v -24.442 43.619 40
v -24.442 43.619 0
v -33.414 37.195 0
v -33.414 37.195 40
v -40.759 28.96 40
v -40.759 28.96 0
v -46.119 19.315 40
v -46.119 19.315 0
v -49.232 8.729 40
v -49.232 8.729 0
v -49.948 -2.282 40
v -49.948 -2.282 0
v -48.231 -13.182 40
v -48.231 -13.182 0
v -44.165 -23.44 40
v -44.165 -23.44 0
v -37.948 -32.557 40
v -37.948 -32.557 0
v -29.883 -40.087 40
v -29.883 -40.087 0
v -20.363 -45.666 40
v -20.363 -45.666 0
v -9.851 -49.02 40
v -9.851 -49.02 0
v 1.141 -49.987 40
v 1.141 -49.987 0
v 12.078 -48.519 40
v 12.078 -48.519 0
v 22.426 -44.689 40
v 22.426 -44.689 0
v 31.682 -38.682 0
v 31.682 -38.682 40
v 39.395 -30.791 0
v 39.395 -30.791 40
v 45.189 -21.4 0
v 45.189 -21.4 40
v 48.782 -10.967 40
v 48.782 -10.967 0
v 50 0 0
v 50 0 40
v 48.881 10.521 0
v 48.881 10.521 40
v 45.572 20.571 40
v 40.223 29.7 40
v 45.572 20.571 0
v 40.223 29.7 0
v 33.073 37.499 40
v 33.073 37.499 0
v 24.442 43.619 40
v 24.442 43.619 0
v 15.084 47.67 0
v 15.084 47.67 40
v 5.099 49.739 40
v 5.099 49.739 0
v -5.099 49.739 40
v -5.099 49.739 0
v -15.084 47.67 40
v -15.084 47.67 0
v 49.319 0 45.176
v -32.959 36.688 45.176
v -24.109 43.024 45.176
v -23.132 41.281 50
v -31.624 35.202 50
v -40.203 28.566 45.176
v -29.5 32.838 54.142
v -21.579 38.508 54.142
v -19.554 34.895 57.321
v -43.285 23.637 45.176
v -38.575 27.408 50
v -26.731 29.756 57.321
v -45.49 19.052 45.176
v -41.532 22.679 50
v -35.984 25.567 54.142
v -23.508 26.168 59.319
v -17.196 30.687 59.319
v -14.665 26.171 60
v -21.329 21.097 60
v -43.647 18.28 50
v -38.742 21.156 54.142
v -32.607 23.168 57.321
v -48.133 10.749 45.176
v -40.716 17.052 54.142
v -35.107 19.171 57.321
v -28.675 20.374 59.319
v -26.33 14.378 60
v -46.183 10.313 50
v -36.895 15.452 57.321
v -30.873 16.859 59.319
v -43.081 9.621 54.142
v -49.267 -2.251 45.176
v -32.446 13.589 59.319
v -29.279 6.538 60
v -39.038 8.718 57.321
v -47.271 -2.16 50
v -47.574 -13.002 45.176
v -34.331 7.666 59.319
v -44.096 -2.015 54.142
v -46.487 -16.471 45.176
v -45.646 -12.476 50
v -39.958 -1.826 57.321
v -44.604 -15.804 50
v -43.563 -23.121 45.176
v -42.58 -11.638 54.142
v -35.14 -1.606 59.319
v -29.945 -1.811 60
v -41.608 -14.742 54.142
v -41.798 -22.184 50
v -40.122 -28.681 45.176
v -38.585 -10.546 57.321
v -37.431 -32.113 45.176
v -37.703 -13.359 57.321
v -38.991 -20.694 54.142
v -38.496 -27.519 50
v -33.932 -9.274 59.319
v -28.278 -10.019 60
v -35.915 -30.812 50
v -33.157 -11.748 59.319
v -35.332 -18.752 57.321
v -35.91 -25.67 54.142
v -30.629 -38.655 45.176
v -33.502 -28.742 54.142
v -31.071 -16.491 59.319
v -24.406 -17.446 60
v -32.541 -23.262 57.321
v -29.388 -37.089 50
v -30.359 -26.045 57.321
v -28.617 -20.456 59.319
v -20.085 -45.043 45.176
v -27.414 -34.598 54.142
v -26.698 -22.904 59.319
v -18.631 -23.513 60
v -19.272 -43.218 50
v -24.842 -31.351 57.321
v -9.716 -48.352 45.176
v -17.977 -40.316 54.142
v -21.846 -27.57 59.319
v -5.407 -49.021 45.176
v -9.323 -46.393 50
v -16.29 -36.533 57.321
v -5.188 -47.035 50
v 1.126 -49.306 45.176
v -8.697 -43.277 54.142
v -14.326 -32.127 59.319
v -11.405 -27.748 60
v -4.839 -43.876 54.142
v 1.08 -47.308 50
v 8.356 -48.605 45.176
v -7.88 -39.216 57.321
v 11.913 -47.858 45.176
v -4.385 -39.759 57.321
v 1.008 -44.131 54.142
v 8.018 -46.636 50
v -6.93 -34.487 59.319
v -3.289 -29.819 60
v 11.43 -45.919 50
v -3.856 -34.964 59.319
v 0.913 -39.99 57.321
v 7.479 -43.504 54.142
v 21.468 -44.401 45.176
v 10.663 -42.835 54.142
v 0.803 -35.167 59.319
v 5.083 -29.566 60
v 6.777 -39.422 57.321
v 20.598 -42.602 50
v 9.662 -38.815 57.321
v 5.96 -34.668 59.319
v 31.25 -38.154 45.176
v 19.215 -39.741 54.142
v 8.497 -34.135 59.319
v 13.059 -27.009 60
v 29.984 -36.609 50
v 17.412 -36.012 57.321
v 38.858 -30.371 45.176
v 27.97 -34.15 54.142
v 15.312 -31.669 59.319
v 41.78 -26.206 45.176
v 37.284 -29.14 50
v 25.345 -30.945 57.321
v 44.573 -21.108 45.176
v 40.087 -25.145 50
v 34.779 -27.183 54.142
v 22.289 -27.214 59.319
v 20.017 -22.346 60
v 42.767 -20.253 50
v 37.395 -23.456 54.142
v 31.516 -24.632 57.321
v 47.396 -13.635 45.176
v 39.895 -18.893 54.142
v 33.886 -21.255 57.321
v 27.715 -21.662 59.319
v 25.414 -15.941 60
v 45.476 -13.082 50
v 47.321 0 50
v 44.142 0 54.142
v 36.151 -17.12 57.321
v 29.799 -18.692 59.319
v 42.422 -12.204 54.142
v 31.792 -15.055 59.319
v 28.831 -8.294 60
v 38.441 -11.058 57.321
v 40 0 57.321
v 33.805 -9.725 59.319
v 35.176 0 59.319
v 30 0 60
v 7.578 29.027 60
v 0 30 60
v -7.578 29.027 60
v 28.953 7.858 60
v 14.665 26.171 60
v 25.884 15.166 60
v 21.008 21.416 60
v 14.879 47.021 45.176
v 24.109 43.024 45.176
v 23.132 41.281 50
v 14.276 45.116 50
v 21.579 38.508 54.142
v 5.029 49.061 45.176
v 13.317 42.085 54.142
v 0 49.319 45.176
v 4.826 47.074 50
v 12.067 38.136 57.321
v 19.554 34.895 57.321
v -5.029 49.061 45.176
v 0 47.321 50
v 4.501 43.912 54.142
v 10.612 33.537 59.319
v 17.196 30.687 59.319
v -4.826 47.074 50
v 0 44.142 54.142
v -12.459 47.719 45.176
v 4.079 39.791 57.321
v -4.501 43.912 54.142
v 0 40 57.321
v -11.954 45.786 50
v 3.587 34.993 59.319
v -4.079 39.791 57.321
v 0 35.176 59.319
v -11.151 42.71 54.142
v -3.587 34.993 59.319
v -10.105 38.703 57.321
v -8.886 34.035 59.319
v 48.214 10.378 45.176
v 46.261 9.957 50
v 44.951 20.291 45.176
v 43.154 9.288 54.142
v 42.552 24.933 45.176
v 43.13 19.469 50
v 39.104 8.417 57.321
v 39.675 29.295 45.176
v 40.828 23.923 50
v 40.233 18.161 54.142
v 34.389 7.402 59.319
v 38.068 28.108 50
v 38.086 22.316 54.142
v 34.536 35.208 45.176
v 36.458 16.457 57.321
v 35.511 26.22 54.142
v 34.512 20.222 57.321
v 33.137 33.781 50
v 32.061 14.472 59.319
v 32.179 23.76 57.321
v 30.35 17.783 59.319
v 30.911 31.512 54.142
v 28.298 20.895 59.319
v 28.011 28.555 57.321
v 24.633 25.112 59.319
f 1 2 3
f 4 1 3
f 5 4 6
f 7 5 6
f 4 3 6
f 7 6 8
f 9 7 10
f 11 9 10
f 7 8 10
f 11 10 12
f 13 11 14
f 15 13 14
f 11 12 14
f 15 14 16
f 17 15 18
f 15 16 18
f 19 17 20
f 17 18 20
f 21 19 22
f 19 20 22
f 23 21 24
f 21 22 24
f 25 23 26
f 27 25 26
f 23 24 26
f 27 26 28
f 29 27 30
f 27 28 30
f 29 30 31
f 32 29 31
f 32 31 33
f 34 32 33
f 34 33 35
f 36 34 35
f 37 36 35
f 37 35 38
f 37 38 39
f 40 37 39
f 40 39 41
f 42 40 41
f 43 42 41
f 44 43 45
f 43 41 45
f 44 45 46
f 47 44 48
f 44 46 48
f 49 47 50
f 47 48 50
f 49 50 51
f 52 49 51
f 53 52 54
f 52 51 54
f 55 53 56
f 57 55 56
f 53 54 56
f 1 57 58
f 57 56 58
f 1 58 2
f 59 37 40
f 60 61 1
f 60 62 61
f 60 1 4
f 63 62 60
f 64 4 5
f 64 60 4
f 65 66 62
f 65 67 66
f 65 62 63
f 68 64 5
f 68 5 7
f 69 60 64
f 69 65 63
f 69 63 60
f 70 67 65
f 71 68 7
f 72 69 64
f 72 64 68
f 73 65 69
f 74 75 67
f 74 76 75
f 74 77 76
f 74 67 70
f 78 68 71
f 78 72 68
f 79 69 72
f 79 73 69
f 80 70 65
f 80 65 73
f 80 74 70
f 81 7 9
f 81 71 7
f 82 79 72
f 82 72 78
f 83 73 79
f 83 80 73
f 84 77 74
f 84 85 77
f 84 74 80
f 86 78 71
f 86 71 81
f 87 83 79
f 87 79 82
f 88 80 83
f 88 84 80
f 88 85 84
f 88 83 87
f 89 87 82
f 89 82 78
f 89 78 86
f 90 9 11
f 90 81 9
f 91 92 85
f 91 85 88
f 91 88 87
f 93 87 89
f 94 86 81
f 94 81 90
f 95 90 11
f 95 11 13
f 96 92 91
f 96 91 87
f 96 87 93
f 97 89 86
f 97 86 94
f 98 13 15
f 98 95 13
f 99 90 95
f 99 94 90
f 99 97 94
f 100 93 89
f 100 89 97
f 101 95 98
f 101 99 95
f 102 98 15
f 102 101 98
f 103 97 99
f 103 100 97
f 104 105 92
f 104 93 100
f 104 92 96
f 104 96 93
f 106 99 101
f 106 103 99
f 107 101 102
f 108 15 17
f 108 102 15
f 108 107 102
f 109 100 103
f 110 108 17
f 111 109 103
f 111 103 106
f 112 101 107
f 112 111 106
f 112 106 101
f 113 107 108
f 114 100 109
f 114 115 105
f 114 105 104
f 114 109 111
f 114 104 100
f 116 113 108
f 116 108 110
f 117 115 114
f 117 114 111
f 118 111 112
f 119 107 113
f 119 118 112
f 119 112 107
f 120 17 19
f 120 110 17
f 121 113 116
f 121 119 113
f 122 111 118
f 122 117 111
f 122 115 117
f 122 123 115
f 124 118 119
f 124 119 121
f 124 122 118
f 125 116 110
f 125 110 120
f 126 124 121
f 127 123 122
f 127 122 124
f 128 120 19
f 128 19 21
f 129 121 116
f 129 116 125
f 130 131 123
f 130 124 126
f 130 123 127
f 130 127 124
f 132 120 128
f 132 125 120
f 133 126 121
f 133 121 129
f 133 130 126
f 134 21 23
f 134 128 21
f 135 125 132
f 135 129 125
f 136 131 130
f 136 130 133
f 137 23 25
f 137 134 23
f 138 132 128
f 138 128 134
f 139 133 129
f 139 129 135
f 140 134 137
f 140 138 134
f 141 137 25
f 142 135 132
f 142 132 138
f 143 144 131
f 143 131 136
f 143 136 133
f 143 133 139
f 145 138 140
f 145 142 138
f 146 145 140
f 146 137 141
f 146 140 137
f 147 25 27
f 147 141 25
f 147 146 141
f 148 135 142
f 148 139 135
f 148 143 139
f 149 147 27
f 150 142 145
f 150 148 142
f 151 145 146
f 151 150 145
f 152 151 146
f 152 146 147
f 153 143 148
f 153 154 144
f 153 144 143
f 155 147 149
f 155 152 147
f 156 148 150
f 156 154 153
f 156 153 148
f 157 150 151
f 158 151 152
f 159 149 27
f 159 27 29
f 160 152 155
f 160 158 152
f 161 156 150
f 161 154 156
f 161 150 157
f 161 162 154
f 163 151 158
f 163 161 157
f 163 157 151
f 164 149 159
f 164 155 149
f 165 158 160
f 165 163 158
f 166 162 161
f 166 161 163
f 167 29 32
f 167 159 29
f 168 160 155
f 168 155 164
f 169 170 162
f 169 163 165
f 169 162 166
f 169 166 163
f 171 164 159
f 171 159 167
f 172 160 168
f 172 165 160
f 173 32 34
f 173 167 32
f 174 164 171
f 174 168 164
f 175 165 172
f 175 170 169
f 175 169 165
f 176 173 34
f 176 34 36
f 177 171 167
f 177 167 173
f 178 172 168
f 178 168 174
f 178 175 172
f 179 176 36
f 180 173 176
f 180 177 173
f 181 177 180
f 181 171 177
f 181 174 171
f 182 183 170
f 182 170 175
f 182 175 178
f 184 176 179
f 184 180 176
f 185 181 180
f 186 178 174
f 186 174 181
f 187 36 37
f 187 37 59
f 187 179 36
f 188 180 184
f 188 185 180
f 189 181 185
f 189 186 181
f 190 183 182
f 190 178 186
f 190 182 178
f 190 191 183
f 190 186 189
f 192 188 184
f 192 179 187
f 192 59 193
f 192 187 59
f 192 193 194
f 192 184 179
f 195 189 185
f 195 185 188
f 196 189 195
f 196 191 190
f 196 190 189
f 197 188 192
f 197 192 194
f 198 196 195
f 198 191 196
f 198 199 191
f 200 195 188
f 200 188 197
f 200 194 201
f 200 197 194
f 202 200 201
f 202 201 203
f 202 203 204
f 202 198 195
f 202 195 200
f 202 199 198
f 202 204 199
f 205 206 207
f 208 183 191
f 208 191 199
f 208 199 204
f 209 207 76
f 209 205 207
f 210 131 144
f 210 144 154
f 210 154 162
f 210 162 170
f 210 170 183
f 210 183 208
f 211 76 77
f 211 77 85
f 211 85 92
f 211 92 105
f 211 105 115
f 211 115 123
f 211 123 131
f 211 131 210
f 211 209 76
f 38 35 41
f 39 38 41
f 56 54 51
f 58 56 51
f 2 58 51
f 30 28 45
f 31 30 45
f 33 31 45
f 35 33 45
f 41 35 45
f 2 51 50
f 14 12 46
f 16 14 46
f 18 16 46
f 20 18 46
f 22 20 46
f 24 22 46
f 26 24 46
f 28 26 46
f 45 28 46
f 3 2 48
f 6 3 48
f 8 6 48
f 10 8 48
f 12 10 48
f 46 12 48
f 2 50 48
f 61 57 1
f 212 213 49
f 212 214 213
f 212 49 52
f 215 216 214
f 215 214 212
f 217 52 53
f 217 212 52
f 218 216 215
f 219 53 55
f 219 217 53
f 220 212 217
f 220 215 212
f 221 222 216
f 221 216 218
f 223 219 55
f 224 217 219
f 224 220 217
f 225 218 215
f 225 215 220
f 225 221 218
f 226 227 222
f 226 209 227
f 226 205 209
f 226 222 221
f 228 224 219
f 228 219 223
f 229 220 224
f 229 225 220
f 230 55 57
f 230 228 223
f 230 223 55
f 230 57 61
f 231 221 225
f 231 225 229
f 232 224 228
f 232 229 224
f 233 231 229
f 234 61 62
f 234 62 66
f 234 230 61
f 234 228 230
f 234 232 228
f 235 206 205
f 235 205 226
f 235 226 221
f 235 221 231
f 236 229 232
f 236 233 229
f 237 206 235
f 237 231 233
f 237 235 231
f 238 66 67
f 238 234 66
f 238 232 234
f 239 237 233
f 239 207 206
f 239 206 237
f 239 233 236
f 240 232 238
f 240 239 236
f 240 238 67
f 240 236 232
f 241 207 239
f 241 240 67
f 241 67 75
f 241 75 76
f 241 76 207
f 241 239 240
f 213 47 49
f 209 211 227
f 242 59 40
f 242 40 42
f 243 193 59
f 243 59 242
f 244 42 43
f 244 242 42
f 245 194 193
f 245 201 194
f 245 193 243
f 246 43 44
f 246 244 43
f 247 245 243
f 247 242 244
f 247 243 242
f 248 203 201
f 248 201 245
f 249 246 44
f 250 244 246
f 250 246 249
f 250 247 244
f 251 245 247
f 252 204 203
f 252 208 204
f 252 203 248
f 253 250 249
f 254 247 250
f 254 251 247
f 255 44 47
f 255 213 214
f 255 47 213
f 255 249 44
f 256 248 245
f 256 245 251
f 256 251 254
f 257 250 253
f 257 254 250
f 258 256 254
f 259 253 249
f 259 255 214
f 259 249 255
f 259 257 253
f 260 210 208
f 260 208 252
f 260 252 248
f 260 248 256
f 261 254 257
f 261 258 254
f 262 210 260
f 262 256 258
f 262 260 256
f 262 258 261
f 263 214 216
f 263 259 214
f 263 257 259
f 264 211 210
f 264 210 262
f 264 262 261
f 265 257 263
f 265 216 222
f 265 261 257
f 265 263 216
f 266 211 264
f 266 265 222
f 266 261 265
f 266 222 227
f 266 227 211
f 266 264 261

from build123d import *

# Parameters (mm, degrees)
F1_DEPTH = 60
F2_R     = 20


with BuildPart() as f1:
    # F0 (on Top) → F1 (new body)
    with BuildSketch(Plane.XY):
        with BuildLine():
            Line((-24.4422037458, 43.6185588488), (24.4422037458, 43.6185588488))
            ThreePointArc((24.4422037458, 43.6185588488), (0, 50), (-24.4422037458, 43.6185588488))
        make_face()
        with BuildLine():
            ThreePointArc((-24.4422037458, 43.6185588488), (-25.2773595606, -43.1399477705), (50, 0))
            ThreePointArc((50, 0), (43.1399477705, 25.2773595606), (24.4422037458, 43.6185588488))
            Line((24.4422037458, 43.6185588488), (-24.4422037458, 43.6185588488))
        make_face()
    extrude(amount=F1_DEPTH)

    # F2
    f2_edges = [f1.edges().sort_by_distance(p)[0] for p in [
        (24.442204, -43.618559, 60),
    ]]
    fillet(f2_edges, radius=F2_R)


solid = f1.part
